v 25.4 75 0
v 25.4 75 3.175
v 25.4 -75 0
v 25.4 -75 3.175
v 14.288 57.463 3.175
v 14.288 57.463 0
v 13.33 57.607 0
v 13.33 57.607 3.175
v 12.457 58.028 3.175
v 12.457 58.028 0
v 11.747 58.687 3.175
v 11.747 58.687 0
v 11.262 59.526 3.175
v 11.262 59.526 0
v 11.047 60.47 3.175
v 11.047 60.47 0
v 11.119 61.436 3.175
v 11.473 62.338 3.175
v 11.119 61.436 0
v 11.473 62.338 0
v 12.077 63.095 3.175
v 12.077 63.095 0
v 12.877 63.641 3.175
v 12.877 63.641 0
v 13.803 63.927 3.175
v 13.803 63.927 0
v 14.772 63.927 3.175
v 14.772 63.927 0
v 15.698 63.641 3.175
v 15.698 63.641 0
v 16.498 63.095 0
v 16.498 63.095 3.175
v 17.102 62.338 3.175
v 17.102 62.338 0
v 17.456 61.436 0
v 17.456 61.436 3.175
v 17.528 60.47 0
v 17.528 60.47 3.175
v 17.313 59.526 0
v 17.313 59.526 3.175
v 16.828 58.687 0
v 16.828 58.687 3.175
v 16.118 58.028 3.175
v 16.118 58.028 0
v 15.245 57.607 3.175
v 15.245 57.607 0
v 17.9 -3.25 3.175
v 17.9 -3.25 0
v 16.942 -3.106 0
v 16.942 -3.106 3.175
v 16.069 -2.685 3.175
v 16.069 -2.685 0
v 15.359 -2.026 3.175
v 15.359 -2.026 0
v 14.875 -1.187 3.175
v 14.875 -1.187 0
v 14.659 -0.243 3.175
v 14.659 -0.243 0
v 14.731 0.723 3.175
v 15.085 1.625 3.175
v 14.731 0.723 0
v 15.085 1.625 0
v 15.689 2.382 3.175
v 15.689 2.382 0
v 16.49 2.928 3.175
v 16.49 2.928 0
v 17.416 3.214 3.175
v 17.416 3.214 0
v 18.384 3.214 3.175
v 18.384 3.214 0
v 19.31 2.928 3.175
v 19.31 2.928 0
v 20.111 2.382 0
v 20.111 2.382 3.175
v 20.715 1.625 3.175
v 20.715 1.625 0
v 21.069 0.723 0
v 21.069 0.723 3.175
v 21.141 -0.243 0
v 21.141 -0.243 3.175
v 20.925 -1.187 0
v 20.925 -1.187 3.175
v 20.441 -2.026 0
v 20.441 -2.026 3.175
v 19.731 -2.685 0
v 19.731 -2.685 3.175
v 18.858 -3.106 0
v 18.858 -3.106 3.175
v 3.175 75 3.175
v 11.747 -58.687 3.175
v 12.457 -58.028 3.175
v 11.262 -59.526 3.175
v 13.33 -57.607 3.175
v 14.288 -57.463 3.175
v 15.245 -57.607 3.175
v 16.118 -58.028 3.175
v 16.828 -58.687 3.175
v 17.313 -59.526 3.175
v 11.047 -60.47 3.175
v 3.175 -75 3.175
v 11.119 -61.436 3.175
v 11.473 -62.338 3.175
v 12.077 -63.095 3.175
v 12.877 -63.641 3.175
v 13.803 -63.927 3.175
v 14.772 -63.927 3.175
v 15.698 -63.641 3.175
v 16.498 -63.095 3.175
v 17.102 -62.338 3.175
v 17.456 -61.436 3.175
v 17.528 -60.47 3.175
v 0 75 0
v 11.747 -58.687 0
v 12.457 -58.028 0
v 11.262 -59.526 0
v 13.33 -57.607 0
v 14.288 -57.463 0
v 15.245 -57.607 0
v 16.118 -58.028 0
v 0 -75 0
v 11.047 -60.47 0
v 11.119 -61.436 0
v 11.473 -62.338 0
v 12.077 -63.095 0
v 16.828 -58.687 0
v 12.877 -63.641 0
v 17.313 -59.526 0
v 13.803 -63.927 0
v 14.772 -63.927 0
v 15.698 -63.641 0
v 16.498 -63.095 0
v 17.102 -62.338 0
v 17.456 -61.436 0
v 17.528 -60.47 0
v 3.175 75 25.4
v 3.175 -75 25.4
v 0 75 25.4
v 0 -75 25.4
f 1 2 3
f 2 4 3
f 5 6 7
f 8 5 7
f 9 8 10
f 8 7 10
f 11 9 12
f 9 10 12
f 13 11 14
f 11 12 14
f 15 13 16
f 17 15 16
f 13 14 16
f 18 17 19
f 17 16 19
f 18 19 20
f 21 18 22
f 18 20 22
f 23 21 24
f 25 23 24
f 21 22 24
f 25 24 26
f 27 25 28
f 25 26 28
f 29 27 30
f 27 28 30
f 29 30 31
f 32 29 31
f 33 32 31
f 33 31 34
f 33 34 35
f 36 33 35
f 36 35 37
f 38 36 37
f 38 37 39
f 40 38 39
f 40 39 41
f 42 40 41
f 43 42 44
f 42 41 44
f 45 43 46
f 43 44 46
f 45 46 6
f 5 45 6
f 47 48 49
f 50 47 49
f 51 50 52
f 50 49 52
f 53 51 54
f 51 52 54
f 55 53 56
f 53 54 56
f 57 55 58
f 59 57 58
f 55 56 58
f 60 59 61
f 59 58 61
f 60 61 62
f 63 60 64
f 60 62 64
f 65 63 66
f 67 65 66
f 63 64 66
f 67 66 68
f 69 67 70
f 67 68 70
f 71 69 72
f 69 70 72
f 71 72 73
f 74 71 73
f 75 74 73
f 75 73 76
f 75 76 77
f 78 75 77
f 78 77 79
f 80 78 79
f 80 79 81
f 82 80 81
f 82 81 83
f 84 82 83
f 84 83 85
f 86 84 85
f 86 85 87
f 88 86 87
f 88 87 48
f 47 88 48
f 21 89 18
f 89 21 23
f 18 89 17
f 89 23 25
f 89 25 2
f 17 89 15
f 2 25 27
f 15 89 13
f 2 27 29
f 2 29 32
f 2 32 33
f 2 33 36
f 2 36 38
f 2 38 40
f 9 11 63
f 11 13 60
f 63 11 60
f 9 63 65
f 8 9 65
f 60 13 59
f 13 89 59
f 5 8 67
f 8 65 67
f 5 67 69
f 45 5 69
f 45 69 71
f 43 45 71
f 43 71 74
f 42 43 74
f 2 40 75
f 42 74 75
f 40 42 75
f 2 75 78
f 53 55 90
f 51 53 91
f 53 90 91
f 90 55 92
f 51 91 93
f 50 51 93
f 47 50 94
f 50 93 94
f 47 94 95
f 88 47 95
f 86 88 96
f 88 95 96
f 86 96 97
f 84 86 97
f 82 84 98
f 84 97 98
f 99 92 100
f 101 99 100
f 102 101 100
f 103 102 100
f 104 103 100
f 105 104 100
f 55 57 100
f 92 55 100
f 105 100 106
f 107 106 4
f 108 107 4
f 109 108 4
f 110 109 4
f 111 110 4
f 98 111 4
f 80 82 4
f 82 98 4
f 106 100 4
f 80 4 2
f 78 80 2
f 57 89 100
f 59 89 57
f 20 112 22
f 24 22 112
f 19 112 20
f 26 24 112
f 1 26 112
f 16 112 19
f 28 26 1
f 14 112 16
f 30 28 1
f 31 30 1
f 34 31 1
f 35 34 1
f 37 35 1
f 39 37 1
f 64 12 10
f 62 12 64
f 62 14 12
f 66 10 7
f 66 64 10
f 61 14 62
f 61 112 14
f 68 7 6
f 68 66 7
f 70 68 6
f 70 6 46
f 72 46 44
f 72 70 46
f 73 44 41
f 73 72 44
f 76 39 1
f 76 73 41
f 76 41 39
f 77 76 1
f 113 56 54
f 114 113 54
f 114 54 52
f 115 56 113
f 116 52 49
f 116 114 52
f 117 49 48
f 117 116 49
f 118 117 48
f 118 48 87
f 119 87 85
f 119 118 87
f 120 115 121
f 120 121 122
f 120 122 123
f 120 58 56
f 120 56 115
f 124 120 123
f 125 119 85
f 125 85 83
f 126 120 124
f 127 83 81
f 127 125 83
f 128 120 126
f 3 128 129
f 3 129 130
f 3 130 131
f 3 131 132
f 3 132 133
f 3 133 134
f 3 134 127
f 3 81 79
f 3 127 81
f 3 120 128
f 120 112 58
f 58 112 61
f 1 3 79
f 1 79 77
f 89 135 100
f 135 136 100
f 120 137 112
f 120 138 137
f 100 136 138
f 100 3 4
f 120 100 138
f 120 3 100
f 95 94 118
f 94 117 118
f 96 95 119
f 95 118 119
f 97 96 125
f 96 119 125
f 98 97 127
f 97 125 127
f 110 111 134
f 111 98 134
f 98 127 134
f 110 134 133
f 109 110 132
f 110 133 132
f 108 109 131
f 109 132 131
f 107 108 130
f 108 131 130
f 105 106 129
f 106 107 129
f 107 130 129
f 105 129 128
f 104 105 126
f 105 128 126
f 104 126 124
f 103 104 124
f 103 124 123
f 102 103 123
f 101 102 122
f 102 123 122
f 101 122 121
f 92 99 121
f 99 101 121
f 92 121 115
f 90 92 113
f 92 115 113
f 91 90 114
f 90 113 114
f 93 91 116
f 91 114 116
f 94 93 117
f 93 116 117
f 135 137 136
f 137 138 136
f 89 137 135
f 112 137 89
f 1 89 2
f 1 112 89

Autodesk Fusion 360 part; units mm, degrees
sketch "Sketch1" plane through (0, 0, 0) normal (0, 1, 0) x (1, 0, 0)
  line L0 (0, -25.4) -> (0, 0)
  line L1 (0, 0) -> (25.4, 0)
  line L2 (12.7, -12.7) -> (11.05, -11.05) construction
  line L3 (3.175, -25.4) -> (3.175, -3.175)
  line L4 (3.175, -3.175) -> (25.4, -3.175)
  line L5 (25.4, -3.175) -> (25.4, 0)
  line L6 (0, -25.4) -> (3.175, -25.4)
  dimension "d1" = 25.4
  dimension "d2" = 25.4
  dimension "d13" = 3.175
extrude "Extrude1" add sketch "Sketch1" along normal blind 75
hole "Hole3" at (3.175, 110.487, 14.2875) direction (-1, 0, 0) diameter 6.5 end through all
hole "Hole4" at (14.2875, 60.713, 3.175) direction (0, 0, -1) diameter 6.5 depth 30 tip angle 118
mirror "Mirror1" about plane through (0, 0, 0) normal (0, 1, 0) of bodies 1 merged
hole "Hole5" at (17.9, 0, 3.175) direction (0, 0, -1) diameter 6.5 depth 30 tip angle 118
equation "d27 = ( 22.225 / 2 ) * 1 mm"
equation "d35 = ( 22.225 / 2 ) * 1 mm"
